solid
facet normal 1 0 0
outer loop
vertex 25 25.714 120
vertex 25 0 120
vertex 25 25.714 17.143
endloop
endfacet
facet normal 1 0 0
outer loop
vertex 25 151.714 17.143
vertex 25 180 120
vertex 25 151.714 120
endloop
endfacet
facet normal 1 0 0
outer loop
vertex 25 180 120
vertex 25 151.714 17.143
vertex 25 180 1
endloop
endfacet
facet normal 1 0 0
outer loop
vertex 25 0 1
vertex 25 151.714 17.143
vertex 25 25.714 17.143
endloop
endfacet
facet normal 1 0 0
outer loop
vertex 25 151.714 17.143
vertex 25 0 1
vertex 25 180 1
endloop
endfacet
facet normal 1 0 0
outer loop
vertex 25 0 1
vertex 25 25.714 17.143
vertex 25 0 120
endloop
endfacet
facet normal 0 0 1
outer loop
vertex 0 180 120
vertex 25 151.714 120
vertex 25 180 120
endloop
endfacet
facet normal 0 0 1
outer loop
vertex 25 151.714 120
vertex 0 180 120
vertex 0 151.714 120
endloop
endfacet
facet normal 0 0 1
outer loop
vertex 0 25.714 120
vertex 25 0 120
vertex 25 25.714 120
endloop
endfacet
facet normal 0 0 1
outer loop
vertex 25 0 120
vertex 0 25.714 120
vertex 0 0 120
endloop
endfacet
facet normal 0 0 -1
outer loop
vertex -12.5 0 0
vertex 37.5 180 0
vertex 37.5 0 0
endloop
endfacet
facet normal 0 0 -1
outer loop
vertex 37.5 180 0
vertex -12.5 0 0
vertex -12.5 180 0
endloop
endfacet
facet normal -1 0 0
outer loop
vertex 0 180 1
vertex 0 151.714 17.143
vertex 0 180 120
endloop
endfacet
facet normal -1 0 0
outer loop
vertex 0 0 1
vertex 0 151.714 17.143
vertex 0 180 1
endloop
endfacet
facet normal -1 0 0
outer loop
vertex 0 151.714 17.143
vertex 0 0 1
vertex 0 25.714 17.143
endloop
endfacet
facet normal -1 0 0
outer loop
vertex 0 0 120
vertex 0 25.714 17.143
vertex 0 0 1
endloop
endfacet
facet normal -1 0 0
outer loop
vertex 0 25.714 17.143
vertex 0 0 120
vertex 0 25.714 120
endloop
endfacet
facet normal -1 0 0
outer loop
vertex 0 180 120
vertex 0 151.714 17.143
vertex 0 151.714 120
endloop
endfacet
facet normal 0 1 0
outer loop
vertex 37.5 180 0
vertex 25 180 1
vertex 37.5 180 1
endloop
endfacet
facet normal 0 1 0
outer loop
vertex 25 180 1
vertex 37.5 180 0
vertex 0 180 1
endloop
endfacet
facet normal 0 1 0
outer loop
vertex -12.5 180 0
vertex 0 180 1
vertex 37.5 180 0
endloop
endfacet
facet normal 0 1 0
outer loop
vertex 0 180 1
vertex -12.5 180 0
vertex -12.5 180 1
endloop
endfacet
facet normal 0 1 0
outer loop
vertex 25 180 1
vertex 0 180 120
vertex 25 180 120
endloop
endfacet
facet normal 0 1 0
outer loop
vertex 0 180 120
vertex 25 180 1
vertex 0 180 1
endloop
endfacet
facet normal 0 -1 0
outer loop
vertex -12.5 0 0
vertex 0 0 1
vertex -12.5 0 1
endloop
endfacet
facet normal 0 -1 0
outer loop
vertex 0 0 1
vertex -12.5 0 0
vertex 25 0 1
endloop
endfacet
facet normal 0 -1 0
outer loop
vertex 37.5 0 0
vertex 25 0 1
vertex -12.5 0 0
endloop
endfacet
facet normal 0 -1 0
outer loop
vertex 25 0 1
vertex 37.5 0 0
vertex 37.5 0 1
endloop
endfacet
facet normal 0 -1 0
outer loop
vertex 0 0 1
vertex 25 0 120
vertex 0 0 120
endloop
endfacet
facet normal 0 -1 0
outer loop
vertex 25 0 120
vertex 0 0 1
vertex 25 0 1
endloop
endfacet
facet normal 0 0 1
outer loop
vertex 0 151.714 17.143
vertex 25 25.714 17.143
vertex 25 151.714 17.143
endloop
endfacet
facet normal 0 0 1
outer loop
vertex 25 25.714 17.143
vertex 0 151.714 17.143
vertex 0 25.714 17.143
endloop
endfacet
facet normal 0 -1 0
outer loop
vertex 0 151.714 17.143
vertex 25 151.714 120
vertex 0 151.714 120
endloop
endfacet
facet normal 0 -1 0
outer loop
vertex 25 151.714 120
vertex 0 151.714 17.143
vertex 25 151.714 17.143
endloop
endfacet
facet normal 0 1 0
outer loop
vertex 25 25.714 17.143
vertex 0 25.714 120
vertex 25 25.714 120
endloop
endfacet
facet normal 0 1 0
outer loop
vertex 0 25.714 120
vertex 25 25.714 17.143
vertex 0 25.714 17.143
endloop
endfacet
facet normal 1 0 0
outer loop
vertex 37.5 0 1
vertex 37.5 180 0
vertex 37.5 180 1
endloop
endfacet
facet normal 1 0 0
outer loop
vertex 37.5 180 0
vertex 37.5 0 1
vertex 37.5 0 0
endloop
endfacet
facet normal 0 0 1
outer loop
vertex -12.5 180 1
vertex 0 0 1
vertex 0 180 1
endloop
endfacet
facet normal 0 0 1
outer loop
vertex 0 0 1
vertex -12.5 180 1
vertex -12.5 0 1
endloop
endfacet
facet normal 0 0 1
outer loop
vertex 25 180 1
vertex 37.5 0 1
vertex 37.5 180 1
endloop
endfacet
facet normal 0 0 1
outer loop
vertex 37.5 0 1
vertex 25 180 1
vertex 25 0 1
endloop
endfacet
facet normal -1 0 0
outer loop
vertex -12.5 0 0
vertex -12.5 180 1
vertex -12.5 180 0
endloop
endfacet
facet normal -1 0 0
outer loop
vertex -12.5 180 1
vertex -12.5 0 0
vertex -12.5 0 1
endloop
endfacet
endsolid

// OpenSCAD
y = 120;
x = 25;
z = 180;
difference(){
    cube([x,z,y], center =false);
    #translate([-x/2,z/7,y/7])
    cube([x*2,z*0.7,200], center =false);
}
translate([-x/2,0,0])
cube([x*2,z,1], center =false);
